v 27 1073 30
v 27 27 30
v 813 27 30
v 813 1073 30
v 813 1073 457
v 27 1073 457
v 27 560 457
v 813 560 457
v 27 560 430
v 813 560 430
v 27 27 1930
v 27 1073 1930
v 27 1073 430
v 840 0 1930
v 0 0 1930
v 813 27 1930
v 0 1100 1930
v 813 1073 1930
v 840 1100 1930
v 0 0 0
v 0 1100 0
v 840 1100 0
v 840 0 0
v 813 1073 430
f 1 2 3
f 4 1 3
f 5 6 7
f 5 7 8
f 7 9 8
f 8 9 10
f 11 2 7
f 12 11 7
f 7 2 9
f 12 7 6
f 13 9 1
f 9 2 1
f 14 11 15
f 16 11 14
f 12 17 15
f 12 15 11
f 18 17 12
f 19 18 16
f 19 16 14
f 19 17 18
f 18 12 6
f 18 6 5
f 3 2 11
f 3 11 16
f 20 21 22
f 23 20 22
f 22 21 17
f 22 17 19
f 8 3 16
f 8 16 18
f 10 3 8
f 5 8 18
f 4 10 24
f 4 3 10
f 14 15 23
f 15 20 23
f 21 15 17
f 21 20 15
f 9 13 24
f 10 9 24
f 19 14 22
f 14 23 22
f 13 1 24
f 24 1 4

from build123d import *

# Parameters (mm, degrees)
ESQUISSE1_W        = 840
ESQUISSE1_H        = 1100
BOSS_EXTRU_1_DEPTH = 30
ESQUISSE2_W        = 840
ESQUISSE2_H        = 1100
ESQUISSE2_W_2      = 786
ESQUISSE2_H_2      = 1046
BOSS_EXTRU_2_DEPTH = 1900
ESQUISSE4_W        = 786
ESQUISSE4_H        = 27
BOSS_EXTRU_3_DEPTH = 540


with BuildPart() as part:
    # Esquisse1 → Boss.-Extru.1 (new body)
    with BuildSketch(Plane.XY):
        with Locations((420, 550)):
            Rectangle(ESQUISSE1_W, ESQUISSE1_H)
    extrude(amount=BOSS_EXTRU_1_DEPTH)

    # Esquisse2 → Boss.-Extru.2 (add)
    with BuildSketch(Plane.XY.offset(30)):
        with Locations((420, 550)):
            Rectangle(ESQUISSE2_W, ESQUISSE2_H)
        with Locations((420, 550)):
            Rectangle(ESQUISSE2_W_2, ESQUISSE2_H_2, mode=Mode.SUBTRACT)
    extrude(amount=BOSS_EXTRU_2_DEPTH)

    # Esquisse4 → Boss.-Extru.3 (add)
    with BuildSketch(Plane(origin=(0, 1100, 0), x_dir=(1, 0, 0), z_dir=(0, 1, 0))):
        with Locations((420, -443.5)):
            Rectangle(ESQUISSE4_W, ESQUISSE4_H)
    extrude(amount=-BOSS_EXTRU_3_DEPTH)


solid = part.part
